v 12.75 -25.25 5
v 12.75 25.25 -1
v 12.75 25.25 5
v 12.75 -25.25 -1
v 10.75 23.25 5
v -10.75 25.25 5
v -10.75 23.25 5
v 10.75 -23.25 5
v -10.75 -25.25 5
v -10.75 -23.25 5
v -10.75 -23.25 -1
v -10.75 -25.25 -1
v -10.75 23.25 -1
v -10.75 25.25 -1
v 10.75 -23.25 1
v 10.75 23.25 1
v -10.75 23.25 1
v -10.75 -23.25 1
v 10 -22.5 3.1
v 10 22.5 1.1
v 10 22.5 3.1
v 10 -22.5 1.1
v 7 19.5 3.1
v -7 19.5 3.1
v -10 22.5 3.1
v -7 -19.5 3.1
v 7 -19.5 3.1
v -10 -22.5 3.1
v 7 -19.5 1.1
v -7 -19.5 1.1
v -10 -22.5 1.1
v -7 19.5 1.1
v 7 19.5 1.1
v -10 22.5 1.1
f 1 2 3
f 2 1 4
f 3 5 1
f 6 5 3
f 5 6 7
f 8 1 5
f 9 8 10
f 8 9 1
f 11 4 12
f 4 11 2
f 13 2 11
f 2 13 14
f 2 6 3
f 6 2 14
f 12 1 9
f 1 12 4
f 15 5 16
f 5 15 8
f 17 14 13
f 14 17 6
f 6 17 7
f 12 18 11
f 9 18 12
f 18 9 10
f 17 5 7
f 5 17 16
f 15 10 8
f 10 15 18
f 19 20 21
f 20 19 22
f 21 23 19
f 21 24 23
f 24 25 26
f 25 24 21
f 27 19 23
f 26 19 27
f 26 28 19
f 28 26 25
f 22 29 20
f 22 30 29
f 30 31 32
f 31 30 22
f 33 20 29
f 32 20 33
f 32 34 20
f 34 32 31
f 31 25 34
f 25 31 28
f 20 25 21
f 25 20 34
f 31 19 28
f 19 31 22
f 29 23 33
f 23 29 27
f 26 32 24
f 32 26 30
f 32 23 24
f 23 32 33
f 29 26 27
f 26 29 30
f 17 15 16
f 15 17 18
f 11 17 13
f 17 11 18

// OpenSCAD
w_back = 70;
h_back = 45;
w_controller = 20;
thickness_bottom = 2;
thickness_top = 2;
width_frame_window = 3;

h_walls = 4;
thickness_walls = 2;
gap_backlight = 1.5;

kit_controller();
//walls();
// debug_controller();

module frame_controller() {
    difference() {
        cube([w_controller, h_back, thickness_top], center=true);
        cube([w_controller-2*width_frame_window, h_back-2*width_frame_window,
        thickness_top+1], center=true);
    }
}

module debug_controller() {
    difference() {
        kit_controller();
        translate([-w_controller/2, 0, h_walls/2])
        cube([w_controller, h_back+2*thickness_walls+gap_backlight+1, 2*h_walls],
        center=true);
    }
}

module kit_controller() {
    controller();
    translate([0, 0, h_walls/2])
    walls();
    color("green")
    translate([0, 0, thickness_bottom+0.1])
    frame_controller();
}

module walls() {
    difference() {
        cube([w_controller+2*thickness_walls+gap_backlight, h_back+2*thickness_walls+gap_backlight, thickness_bottom+h_walls], center=true);
        color("red")
        cube([w_controller+gap_backlight, h_back+gap_backlight, thickness_bottom+h_walls+1], center=true);
        translate([-w_controller-thickness_walls+gap_backlight/2-0.25, 0, 0])
        cube([w_controller+gap_backlight, h_back+gap_backlight+2*+thickness_walls + 1, thickness_bottom+h_walls+1], center=true);
    }
}

module controller() {
    cube([w_controller+gap_backlight, h_back+gap_backlight, thickness_bottom], center=true);
}
